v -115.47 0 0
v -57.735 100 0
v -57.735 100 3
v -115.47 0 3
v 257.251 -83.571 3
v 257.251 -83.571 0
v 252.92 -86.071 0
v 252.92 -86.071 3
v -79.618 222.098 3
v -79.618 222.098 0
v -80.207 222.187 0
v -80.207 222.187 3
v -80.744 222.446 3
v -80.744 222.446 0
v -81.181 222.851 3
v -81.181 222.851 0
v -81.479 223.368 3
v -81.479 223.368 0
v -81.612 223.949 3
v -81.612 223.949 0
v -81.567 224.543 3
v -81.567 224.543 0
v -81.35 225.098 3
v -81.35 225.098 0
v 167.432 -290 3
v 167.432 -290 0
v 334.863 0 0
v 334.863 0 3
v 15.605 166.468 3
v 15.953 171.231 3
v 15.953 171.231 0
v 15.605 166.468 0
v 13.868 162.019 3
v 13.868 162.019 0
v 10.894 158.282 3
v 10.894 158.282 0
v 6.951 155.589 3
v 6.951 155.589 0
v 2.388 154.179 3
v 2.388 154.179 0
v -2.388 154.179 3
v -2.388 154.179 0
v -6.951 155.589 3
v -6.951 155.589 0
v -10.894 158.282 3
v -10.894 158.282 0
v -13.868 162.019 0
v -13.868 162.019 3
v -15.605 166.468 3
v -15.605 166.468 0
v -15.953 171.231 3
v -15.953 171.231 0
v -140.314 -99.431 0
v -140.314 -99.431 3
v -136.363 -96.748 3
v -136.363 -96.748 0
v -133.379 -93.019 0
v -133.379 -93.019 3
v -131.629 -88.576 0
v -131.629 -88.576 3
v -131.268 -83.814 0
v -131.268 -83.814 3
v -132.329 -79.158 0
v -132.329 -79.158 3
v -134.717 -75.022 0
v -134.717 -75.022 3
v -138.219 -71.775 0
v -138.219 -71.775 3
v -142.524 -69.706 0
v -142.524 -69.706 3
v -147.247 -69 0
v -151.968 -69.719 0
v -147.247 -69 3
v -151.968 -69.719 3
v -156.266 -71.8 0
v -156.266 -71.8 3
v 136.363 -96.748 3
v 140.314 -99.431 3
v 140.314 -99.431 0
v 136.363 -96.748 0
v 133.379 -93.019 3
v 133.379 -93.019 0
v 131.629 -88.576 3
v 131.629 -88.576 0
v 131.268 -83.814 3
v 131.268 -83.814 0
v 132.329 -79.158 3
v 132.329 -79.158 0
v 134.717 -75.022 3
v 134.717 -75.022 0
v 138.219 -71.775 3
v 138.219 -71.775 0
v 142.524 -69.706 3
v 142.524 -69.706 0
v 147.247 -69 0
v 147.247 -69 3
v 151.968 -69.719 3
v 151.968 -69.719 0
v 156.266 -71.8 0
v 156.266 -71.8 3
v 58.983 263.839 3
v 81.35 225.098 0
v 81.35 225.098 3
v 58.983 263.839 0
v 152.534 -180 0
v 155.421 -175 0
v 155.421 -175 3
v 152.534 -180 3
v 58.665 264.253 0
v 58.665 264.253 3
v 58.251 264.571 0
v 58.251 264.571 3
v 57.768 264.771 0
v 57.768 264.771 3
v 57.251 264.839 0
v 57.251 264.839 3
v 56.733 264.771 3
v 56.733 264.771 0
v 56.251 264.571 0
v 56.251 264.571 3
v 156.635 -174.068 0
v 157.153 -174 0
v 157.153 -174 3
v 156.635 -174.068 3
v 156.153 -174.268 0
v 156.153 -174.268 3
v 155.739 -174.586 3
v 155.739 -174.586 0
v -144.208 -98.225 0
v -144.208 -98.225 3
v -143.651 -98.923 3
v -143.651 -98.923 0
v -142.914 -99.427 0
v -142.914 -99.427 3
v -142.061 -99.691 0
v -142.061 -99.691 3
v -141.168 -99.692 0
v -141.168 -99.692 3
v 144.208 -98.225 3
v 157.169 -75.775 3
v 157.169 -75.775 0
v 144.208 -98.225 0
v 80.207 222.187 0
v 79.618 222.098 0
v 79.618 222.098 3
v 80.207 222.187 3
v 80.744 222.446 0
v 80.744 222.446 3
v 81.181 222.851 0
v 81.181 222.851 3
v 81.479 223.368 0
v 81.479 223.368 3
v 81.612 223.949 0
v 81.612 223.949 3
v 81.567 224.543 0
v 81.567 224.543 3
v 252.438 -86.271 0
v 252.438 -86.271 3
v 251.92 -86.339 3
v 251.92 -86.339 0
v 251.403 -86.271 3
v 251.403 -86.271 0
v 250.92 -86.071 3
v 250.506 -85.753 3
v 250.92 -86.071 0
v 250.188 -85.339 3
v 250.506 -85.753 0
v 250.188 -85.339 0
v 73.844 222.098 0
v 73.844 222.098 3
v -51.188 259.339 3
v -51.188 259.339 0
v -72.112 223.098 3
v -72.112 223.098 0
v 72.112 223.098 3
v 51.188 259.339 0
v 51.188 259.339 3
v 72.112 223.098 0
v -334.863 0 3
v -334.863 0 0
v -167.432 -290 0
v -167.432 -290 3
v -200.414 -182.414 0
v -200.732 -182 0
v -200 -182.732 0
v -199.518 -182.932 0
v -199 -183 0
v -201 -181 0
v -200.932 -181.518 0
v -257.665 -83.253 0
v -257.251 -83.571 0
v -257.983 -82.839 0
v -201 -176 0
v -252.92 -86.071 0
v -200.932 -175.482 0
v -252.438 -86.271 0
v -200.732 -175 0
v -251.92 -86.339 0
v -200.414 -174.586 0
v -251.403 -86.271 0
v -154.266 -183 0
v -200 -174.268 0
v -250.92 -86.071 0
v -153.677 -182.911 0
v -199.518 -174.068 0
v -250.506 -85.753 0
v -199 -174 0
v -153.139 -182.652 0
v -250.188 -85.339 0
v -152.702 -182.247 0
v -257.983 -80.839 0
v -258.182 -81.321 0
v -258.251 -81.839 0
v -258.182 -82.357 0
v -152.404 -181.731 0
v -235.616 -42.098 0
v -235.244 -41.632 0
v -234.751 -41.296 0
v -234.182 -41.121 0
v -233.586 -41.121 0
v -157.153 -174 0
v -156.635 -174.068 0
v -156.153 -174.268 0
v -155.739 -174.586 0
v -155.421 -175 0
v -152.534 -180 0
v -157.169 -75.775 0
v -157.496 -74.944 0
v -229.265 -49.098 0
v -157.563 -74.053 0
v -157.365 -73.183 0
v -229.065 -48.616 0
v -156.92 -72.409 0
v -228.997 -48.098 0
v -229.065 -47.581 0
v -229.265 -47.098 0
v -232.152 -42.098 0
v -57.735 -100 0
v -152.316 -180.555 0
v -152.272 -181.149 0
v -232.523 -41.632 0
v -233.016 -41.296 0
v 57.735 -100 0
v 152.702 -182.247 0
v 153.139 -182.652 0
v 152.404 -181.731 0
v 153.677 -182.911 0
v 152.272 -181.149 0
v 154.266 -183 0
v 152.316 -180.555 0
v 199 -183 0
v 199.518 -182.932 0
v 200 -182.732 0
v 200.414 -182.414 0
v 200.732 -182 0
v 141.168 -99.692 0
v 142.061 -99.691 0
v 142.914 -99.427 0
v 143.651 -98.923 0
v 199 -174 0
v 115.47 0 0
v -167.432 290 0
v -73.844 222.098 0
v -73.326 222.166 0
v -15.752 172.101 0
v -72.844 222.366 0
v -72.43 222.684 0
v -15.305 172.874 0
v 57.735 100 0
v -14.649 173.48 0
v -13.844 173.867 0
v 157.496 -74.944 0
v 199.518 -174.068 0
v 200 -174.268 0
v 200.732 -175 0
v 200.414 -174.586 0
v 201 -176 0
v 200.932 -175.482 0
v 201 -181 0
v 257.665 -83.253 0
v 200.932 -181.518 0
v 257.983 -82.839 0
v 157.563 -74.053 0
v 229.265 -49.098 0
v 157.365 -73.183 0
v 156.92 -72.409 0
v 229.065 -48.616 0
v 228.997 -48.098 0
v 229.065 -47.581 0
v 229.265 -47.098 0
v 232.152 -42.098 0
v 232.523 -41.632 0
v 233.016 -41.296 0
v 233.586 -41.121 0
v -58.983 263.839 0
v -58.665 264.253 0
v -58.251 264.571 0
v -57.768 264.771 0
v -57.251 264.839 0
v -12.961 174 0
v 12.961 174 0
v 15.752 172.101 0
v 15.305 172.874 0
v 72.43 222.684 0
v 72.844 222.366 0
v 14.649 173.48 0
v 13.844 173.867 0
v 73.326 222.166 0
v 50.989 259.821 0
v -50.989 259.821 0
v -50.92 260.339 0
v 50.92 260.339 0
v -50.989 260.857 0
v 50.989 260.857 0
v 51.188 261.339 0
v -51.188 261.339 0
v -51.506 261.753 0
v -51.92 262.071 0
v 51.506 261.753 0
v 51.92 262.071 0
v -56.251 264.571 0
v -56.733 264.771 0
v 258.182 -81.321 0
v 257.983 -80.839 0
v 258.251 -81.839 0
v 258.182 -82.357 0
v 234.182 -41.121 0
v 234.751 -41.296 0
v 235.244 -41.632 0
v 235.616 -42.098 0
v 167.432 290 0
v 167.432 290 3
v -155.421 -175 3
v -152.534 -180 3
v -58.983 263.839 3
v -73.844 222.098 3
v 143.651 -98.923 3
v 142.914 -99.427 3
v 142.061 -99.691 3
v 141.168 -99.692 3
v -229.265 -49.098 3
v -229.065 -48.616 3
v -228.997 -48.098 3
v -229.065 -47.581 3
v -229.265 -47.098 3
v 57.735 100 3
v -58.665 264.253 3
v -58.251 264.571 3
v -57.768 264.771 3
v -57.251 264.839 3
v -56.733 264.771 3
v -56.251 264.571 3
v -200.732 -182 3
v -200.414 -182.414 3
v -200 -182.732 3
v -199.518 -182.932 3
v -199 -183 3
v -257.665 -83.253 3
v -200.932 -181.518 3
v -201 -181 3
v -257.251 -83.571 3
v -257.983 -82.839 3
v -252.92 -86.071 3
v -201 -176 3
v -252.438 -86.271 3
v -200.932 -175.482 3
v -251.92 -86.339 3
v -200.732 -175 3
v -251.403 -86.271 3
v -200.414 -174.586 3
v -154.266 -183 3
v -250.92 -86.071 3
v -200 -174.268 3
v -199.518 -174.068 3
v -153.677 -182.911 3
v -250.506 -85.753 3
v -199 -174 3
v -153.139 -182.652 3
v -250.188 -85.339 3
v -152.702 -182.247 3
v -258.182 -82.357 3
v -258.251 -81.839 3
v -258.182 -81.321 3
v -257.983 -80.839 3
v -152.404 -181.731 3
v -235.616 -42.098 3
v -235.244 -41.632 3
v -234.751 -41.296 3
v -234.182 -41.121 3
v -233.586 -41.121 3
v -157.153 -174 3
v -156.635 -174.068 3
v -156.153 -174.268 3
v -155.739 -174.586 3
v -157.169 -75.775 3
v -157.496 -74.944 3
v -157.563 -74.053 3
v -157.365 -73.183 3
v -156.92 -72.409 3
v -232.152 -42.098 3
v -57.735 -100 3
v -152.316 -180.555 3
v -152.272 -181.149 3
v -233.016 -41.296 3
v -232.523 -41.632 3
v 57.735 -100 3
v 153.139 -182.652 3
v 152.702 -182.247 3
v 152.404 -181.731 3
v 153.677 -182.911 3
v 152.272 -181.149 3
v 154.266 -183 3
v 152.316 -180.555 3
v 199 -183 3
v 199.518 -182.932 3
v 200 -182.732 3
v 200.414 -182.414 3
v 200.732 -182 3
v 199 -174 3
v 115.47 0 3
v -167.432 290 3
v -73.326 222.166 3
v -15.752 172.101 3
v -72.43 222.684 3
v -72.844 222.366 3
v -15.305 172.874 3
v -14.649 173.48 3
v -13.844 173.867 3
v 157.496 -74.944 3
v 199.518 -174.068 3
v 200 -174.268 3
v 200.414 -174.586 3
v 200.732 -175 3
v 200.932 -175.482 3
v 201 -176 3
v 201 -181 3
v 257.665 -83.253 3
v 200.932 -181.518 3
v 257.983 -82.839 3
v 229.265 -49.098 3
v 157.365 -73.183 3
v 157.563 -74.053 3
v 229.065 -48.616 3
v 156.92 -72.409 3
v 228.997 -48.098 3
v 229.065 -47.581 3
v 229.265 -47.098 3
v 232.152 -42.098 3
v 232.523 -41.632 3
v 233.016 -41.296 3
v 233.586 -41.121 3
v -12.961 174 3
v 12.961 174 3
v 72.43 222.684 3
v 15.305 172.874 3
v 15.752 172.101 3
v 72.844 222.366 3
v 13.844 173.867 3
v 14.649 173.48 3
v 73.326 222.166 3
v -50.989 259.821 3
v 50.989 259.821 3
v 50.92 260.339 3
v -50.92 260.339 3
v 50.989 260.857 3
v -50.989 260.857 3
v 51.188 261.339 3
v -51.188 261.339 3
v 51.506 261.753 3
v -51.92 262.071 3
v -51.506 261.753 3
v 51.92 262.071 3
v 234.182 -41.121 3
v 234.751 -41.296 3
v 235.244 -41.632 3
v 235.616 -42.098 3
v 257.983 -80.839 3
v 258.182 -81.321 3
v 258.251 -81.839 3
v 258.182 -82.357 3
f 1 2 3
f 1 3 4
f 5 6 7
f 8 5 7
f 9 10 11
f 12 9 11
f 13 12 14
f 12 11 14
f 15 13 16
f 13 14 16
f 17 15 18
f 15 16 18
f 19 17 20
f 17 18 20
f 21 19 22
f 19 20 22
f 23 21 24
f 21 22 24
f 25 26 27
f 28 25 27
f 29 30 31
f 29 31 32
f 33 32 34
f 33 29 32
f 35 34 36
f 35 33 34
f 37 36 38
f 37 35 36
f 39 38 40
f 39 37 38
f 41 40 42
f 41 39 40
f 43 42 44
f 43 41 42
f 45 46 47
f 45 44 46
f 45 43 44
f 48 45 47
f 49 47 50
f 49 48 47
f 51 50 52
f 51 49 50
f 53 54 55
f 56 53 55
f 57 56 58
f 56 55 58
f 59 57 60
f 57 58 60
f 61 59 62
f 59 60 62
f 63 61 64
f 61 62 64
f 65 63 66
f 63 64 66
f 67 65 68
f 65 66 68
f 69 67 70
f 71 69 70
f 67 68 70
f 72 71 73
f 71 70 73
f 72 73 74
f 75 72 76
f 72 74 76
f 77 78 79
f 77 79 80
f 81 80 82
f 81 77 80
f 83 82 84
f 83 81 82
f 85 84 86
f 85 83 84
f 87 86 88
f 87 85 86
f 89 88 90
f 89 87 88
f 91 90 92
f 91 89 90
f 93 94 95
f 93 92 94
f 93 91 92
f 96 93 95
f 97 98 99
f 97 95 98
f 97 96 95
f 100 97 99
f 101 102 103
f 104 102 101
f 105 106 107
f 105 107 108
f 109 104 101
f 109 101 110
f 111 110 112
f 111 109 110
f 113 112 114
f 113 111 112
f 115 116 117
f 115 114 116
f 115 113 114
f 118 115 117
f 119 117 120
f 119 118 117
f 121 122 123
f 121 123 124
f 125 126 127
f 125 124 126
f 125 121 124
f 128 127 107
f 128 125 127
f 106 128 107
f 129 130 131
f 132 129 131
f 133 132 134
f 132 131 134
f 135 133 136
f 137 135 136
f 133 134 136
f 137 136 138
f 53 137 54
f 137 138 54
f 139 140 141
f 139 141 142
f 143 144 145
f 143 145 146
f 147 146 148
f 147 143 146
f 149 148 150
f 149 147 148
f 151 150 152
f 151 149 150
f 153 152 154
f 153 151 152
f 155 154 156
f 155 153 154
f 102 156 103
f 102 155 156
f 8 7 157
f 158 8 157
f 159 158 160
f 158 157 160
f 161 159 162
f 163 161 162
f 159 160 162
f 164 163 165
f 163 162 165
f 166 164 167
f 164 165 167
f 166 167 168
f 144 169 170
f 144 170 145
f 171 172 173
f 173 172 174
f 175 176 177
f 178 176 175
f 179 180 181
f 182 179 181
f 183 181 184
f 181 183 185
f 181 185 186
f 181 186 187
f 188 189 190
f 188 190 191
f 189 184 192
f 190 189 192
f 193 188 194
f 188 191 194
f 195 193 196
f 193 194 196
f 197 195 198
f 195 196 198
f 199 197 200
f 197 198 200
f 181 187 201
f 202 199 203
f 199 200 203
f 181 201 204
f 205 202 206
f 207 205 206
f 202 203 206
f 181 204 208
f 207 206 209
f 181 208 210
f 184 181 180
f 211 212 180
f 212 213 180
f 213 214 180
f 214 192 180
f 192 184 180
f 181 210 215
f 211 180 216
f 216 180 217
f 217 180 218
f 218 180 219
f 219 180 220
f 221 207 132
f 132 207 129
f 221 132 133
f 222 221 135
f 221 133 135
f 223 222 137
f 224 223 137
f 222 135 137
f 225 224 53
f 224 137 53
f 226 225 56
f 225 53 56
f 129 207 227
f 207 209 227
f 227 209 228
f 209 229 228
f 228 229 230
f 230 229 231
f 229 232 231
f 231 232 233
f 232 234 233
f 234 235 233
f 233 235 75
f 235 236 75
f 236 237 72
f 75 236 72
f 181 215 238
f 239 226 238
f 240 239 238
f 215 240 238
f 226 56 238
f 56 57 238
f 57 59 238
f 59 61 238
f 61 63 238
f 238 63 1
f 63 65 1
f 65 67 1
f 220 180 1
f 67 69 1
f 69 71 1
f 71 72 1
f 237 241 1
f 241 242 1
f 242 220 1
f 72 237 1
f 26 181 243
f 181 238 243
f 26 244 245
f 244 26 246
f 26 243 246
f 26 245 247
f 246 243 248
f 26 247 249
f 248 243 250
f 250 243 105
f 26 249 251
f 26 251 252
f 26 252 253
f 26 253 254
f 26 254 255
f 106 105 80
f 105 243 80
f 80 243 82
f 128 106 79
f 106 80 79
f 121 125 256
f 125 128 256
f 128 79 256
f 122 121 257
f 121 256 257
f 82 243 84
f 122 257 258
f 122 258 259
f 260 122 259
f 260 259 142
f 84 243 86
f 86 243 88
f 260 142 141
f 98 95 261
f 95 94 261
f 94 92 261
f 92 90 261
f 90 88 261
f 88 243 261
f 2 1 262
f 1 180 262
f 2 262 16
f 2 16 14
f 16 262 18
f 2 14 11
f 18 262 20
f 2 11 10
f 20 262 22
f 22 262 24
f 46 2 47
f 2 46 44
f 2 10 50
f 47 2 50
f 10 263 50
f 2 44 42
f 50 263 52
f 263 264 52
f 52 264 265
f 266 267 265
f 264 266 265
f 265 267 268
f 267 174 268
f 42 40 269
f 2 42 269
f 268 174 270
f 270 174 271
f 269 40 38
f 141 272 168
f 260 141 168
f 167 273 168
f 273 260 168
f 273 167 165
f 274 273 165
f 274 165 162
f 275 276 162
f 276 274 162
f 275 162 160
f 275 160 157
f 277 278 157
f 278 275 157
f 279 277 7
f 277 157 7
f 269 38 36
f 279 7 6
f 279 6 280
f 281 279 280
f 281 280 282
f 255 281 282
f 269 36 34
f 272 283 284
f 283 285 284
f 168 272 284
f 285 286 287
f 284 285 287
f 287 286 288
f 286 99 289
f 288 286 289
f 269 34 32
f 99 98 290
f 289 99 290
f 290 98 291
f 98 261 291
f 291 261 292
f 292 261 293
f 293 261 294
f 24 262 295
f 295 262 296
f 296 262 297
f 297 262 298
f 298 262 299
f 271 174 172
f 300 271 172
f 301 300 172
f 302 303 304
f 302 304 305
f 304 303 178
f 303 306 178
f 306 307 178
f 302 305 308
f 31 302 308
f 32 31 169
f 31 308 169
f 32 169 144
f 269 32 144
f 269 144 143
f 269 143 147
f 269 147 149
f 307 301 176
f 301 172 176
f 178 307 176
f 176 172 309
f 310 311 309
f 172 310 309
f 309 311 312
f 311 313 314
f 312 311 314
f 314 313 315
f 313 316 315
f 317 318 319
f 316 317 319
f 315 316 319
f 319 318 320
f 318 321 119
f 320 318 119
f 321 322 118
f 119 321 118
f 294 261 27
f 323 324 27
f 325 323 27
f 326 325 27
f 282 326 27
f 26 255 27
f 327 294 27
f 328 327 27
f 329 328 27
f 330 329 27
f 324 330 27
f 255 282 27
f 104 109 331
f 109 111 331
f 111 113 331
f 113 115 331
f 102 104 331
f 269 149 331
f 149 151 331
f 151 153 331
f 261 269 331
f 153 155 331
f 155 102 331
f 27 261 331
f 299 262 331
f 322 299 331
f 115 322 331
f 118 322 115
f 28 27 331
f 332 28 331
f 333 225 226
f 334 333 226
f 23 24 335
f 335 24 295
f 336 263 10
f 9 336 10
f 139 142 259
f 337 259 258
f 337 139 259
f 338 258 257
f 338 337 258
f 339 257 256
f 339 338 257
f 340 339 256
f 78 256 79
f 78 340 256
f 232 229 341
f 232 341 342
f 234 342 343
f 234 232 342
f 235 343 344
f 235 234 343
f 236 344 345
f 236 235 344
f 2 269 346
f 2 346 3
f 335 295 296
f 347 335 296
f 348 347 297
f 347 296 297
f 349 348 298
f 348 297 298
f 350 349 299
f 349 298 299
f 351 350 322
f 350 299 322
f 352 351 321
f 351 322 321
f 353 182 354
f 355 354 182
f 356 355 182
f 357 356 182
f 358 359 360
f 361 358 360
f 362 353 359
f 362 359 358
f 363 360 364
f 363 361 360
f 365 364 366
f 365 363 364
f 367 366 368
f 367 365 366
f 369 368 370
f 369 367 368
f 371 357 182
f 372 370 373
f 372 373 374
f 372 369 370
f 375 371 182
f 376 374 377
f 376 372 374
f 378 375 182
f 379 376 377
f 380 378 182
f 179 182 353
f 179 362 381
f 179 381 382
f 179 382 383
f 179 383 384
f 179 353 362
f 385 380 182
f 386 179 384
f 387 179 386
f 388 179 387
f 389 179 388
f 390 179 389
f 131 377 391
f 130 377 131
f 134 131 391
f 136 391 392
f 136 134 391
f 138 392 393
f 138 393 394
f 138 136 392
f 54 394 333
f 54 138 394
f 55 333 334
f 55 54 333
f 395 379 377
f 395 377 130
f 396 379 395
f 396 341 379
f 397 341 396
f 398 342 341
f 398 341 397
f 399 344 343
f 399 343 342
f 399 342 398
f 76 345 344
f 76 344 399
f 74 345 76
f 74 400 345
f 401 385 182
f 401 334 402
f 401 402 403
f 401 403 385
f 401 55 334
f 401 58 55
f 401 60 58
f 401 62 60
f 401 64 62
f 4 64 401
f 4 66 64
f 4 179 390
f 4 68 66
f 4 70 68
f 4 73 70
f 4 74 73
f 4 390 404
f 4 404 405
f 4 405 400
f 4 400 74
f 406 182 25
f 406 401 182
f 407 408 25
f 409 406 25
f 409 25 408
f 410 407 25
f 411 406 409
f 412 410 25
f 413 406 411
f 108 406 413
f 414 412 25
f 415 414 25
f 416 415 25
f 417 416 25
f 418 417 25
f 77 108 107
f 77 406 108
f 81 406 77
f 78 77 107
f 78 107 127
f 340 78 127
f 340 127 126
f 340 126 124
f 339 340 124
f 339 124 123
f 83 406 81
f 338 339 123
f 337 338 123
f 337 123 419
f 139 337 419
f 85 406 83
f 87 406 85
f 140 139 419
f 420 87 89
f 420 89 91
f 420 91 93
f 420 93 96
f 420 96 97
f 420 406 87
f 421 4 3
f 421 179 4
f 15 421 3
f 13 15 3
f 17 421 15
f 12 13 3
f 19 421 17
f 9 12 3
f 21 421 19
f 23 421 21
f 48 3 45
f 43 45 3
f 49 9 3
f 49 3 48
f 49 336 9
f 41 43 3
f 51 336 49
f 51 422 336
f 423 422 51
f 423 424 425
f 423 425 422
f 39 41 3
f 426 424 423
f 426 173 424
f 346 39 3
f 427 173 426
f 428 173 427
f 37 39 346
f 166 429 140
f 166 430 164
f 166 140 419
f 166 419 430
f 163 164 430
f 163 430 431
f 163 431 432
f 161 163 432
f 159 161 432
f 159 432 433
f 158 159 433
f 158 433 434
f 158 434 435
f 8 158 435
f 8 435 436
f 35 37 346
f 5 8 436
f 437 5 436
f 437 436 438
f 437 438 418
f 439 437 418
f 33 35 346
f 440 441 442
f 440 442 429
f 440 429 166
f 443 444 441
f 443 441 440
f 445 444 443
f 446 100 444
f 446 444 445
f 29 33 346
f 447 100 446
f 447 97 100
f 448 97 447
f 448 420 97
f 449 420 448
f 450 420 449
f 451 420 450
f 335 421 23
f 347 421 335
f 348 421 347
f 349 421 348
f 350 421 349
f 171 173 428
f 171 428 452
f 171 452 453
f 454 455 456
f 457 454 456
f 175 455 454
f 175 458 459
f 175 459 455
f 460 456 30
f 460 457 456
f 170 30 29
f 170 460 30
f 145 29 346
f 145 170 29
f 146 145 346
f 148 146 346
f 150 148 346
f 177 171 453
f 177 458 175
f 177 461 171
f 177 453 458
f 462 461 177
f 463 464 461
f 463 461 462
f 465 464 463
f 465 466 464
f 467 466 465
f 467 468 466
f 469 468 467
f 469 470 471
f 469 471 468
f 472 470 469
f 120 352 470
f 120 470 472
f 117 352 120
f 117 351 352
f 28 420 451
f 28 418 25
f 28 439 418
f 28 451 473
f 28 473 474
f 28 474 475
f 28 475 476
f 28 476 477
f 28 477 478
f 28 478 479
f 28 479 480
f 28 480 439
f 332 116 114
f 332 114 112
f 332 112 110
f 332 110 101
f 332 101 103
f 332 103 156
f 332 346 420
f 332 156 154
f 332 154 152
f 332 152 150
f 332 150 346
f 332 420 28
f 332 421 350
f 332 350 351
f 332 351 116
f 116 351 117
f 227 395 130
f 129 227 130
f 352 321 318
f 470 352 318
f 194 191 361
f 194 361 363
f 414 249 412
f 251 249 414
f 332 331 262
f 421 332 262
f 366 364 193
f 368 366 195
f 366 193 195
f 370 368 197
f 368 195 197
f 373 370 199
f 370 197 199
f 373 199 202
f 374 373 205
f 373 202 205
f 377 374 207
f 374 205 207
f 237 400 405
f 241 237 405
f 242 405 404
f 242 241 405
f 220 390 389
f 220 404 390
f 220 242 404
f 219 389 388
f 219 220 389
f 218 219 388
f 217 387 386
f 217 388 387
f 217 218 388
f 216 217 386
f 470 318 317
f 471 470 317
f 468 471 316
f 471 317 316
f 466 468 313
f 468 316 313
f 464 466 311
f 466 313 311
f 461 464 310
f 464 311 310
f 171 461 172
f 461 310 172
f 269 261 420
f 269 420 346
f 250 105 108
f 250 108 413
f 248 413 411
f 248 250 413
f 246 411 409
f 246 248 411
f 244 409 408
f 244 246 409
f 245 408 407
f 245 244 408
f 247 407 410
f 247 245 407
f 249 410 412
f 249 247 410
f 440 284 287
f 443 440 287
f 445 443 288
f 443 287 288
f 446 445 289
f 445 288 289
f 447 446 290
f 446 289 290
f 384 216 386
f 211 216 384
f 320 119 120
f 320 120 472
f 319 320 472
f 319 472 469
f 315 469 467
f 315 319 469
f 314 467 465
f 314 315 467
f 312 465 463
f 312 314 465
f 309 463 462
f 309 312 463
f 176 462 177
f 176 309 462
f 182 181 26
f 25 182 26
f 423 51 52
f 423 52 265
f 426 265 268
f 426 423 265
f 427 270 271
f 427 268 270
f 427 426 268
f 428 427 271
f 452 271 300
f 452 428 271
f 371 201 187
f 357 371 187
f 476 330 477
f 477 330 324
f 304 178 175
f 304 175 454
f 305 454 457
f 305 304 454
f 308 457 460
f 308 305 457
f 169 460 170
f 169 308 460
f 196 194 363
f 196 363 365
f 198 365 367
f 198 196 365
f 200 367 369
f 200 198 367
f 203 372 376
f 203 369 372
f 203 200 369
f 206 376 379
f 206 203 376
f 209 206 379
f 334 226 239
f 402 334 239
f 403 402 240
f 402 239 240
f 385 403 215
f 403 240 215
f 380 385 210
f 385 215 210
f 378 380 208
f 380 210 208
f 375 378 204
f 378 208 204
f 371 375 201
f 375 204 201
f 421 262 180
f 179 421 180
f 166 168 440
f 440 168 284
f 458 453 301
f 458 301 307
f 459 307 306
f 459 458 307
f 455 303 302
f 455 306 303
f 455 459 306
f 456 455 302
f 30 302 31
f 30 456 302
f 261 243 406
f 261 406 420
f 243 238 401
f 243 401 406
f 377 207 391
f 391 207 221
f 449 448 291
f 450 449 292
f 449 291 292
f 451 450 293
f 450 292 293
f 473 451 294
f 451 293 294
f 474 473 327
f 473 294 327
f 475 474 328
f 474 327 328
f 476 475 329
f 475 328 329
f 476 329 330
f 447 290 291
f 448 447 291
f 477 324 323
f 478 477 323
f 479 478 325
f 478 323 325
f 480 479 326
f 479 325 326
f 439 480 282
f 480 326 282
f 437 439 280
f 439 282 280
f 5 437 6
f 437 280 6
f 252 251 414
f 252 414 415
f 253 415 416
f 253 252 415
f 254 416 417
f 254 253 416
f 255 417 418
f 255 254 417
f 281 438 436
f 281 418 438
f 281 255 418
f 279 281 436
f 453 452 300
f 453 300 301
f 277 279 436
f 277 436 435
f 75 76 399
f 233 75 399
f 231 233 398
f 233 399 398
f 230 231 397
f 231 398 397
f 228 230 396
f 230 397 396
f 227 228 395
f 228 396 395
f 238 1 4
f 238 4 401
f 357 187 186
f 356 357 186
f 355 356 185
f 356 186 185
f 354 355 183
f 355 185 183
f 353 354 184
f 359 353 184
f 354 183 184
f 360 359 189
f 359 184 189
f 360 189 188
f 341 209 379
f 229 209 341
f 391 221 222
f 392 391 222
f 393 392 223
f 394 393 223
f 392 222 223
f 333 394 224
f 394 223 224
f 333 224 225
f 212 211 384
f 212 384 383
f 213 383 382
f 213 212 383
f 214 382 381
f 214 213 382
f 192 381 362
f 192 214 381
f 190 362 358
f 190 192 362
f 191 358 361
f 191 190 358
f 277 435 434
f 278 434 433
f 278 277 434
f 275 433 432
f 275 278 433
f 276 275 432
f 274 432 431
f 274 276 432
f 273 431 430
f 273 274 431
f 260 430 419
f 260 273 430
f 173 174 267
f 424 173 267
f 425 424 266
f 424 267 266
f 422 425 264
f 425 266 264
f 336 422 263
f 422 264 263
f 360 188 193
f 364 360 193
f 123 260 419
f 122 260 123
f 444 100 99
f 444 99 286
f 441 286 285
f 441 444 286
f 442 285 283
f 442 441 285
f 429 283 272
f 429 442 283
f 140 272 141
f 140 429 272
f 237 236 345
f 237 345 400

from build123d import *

# Parameters (mm, degrees)
BOSS_EXTRUDE1_DEPTH = 3
CUT_EXTRUDE1_DEPTH  = 443.992475482
CIRPATTERN1_COUNT   = 3
CUT_EXTRUDE2_DEPTH  = 443.992475482


with BuildPart() as part:
    # Sketch1 → Boss-Extrude1 (new body)
    with BuildSketch(Plane.XY):
        Polygon((334.86315613, 0), (167.431578065, 290), (-167.431578065, 290), (-334.86315613, 0), (-167.431578065, -290), (167.431578065, -290), align=None)
        Polygon((57.735026919, 100), (-57.735026919, 100), (-115.470053838, 0), (-57.735026919, -100), (57.735026919, -100), (115.470053838, 0), align=None, mode=Mode.SUBTRACT)
    extrude(amount=BOSS_EXTRUDE1_DEPTH)

    # Sketch2 → Cut-Extrude1 (cut, through all)
    with BuildSketch(Plane(origin=(0, 0, 0), x_dir=(-1, 0, 0), z_dir=(0, 0, -1))):
        with BuildLine():
            Line((-51.188420258, 259.339055353), (-72.112031884, 223.098296941))
            ThreePointArc((-72.112031884, 223.098296941), (-72.844082691, 222.366246133), (-73.844082691, 222.098296941))
            Line((-73.844082691, 222.098296941), (-79.617585383, 222.098296941))
            ThreePointArc((-79.617585383, 222.098296941), (-81.349636191, 223.098296941), (-81.349636191, 225.098296941))
            Line((-81.349636191, 225.098296941), (-58.982648893, 263.839055353))
            ThreePointArc((-58.982648893, 263.839055353), (-57.768236175, 264.770907006), (-56.250598085, 264.571106161))
            Line((-56.250598085, 264.571106161), (-51.920471066, 262.071106161))
            ThreePointArc((-51.920471066, 262.071106161), (-50.988619413, 260.856693443), (-51.188420258, 259.339055353))
        make_face()
        with BuildLine():
            Line((56.250598085, 264.571106161), (51.920471066, 262.071106161))
            ThreePointArc((51.920471066, 262.071106161), (50.988619413, 260.856693443), (51.188420258, 259.339055353))
            Line((51.188420258, 259.339055353), (72.112031884, 223.098296941))
            ThreePointArc((72.112031884, 223.098296941), (72.844082691, 222.366246133), (73.844082691, 222.098296941))
            Line((73.844082691, 222.098296941), (79.617585383, 222.098296941))
            ThreePointArc((79.617585383, 222.098296941), (81.349636191, 223.098296941), (81.349636191, 225.098296941))
            Line((81.349636191, 225.098296941), (58.982648893, 263.839055353))
            ThreePointArc((58.982648893, 263.839055353), (57.768236175, 264.770907006), (56.250598085, 264.571106161))
        make_face()
    cut_extrude1 = extrude(amount=-CUT_EXTRUDE1_DEPTH, mode=Mode.SUBTRACT)

    # CirPattern1: Cut-Extrude1 ×3 about axis
    cirpattern1_axis = Axis((0, 0, -0.2), (0, 0, 1))
    for i in range(1, CIRPATTERN1_COUNT):
        add(cut_extrude1.rotate(cirpattern1_axis, i * 360 / CIRPATTERN1_COUNT), mode=Mode.SUBTRACT)

    # Sketch3 → Cut-Extrude2 (cut, through all)
    with BuildSketch(Plane.XY.offset(3)):
        with BuildLine():
            Line((-12.961481397, 174), (12.961481397, 174))
            ThreePointArc((12.961481397, 174), (14.999580058, 173.201398157), (15.952592488, 171.230769231))
            ThreePointArc((15.952592488, 171.230769231), (0, 154), (-15.952592488, 171.230769231))
            ThreePointArc((-15.952592488, 171.230769231), (-14.999580058, 173.201398157), (-12.961481397, 174))
        make_face()
        with BuildLine():
            Line((-157.169160957, -75.77502784), (-144.20767956, -98.22497216))
            ThreePointArc((-144.20767956, -98.22497216), (-142.497020746, -99.590716455), (-140.313899819, -99.430734967))
            ThreePointArc((-140.313899819, -99.430734967), (-133.367912183, -77), (-156.266492308, -71.800034264))
            ThreePointArc((-156.266492308, -71.800034264), (-157.496600804, -73.610681702), (-157.169160957, -75.77502784))
        make_face()
        with BuildLine():
            Line((157.169160957, -75.77502784), (144.20767956, -98.22497216))
            ThreePointArc((144.20767956, -98.22497216), (142.497020746, -99.590716455), (140.313899819, -99.430734967))
            ThreePointArc((140.313899819, -99.430734967), (133.367912183, -77), (156.266492308, -71.800034264))
            ThreePointArc((156.266492308, -71.800034264), (157.496600804, -73.610681702), (157.169160957, -75.77502784))
        make_face()
    extrude(amount=-CUT_EXTRUDE2_DEPTH, mode=Mode.SUBTRACT)


solid = part.part
